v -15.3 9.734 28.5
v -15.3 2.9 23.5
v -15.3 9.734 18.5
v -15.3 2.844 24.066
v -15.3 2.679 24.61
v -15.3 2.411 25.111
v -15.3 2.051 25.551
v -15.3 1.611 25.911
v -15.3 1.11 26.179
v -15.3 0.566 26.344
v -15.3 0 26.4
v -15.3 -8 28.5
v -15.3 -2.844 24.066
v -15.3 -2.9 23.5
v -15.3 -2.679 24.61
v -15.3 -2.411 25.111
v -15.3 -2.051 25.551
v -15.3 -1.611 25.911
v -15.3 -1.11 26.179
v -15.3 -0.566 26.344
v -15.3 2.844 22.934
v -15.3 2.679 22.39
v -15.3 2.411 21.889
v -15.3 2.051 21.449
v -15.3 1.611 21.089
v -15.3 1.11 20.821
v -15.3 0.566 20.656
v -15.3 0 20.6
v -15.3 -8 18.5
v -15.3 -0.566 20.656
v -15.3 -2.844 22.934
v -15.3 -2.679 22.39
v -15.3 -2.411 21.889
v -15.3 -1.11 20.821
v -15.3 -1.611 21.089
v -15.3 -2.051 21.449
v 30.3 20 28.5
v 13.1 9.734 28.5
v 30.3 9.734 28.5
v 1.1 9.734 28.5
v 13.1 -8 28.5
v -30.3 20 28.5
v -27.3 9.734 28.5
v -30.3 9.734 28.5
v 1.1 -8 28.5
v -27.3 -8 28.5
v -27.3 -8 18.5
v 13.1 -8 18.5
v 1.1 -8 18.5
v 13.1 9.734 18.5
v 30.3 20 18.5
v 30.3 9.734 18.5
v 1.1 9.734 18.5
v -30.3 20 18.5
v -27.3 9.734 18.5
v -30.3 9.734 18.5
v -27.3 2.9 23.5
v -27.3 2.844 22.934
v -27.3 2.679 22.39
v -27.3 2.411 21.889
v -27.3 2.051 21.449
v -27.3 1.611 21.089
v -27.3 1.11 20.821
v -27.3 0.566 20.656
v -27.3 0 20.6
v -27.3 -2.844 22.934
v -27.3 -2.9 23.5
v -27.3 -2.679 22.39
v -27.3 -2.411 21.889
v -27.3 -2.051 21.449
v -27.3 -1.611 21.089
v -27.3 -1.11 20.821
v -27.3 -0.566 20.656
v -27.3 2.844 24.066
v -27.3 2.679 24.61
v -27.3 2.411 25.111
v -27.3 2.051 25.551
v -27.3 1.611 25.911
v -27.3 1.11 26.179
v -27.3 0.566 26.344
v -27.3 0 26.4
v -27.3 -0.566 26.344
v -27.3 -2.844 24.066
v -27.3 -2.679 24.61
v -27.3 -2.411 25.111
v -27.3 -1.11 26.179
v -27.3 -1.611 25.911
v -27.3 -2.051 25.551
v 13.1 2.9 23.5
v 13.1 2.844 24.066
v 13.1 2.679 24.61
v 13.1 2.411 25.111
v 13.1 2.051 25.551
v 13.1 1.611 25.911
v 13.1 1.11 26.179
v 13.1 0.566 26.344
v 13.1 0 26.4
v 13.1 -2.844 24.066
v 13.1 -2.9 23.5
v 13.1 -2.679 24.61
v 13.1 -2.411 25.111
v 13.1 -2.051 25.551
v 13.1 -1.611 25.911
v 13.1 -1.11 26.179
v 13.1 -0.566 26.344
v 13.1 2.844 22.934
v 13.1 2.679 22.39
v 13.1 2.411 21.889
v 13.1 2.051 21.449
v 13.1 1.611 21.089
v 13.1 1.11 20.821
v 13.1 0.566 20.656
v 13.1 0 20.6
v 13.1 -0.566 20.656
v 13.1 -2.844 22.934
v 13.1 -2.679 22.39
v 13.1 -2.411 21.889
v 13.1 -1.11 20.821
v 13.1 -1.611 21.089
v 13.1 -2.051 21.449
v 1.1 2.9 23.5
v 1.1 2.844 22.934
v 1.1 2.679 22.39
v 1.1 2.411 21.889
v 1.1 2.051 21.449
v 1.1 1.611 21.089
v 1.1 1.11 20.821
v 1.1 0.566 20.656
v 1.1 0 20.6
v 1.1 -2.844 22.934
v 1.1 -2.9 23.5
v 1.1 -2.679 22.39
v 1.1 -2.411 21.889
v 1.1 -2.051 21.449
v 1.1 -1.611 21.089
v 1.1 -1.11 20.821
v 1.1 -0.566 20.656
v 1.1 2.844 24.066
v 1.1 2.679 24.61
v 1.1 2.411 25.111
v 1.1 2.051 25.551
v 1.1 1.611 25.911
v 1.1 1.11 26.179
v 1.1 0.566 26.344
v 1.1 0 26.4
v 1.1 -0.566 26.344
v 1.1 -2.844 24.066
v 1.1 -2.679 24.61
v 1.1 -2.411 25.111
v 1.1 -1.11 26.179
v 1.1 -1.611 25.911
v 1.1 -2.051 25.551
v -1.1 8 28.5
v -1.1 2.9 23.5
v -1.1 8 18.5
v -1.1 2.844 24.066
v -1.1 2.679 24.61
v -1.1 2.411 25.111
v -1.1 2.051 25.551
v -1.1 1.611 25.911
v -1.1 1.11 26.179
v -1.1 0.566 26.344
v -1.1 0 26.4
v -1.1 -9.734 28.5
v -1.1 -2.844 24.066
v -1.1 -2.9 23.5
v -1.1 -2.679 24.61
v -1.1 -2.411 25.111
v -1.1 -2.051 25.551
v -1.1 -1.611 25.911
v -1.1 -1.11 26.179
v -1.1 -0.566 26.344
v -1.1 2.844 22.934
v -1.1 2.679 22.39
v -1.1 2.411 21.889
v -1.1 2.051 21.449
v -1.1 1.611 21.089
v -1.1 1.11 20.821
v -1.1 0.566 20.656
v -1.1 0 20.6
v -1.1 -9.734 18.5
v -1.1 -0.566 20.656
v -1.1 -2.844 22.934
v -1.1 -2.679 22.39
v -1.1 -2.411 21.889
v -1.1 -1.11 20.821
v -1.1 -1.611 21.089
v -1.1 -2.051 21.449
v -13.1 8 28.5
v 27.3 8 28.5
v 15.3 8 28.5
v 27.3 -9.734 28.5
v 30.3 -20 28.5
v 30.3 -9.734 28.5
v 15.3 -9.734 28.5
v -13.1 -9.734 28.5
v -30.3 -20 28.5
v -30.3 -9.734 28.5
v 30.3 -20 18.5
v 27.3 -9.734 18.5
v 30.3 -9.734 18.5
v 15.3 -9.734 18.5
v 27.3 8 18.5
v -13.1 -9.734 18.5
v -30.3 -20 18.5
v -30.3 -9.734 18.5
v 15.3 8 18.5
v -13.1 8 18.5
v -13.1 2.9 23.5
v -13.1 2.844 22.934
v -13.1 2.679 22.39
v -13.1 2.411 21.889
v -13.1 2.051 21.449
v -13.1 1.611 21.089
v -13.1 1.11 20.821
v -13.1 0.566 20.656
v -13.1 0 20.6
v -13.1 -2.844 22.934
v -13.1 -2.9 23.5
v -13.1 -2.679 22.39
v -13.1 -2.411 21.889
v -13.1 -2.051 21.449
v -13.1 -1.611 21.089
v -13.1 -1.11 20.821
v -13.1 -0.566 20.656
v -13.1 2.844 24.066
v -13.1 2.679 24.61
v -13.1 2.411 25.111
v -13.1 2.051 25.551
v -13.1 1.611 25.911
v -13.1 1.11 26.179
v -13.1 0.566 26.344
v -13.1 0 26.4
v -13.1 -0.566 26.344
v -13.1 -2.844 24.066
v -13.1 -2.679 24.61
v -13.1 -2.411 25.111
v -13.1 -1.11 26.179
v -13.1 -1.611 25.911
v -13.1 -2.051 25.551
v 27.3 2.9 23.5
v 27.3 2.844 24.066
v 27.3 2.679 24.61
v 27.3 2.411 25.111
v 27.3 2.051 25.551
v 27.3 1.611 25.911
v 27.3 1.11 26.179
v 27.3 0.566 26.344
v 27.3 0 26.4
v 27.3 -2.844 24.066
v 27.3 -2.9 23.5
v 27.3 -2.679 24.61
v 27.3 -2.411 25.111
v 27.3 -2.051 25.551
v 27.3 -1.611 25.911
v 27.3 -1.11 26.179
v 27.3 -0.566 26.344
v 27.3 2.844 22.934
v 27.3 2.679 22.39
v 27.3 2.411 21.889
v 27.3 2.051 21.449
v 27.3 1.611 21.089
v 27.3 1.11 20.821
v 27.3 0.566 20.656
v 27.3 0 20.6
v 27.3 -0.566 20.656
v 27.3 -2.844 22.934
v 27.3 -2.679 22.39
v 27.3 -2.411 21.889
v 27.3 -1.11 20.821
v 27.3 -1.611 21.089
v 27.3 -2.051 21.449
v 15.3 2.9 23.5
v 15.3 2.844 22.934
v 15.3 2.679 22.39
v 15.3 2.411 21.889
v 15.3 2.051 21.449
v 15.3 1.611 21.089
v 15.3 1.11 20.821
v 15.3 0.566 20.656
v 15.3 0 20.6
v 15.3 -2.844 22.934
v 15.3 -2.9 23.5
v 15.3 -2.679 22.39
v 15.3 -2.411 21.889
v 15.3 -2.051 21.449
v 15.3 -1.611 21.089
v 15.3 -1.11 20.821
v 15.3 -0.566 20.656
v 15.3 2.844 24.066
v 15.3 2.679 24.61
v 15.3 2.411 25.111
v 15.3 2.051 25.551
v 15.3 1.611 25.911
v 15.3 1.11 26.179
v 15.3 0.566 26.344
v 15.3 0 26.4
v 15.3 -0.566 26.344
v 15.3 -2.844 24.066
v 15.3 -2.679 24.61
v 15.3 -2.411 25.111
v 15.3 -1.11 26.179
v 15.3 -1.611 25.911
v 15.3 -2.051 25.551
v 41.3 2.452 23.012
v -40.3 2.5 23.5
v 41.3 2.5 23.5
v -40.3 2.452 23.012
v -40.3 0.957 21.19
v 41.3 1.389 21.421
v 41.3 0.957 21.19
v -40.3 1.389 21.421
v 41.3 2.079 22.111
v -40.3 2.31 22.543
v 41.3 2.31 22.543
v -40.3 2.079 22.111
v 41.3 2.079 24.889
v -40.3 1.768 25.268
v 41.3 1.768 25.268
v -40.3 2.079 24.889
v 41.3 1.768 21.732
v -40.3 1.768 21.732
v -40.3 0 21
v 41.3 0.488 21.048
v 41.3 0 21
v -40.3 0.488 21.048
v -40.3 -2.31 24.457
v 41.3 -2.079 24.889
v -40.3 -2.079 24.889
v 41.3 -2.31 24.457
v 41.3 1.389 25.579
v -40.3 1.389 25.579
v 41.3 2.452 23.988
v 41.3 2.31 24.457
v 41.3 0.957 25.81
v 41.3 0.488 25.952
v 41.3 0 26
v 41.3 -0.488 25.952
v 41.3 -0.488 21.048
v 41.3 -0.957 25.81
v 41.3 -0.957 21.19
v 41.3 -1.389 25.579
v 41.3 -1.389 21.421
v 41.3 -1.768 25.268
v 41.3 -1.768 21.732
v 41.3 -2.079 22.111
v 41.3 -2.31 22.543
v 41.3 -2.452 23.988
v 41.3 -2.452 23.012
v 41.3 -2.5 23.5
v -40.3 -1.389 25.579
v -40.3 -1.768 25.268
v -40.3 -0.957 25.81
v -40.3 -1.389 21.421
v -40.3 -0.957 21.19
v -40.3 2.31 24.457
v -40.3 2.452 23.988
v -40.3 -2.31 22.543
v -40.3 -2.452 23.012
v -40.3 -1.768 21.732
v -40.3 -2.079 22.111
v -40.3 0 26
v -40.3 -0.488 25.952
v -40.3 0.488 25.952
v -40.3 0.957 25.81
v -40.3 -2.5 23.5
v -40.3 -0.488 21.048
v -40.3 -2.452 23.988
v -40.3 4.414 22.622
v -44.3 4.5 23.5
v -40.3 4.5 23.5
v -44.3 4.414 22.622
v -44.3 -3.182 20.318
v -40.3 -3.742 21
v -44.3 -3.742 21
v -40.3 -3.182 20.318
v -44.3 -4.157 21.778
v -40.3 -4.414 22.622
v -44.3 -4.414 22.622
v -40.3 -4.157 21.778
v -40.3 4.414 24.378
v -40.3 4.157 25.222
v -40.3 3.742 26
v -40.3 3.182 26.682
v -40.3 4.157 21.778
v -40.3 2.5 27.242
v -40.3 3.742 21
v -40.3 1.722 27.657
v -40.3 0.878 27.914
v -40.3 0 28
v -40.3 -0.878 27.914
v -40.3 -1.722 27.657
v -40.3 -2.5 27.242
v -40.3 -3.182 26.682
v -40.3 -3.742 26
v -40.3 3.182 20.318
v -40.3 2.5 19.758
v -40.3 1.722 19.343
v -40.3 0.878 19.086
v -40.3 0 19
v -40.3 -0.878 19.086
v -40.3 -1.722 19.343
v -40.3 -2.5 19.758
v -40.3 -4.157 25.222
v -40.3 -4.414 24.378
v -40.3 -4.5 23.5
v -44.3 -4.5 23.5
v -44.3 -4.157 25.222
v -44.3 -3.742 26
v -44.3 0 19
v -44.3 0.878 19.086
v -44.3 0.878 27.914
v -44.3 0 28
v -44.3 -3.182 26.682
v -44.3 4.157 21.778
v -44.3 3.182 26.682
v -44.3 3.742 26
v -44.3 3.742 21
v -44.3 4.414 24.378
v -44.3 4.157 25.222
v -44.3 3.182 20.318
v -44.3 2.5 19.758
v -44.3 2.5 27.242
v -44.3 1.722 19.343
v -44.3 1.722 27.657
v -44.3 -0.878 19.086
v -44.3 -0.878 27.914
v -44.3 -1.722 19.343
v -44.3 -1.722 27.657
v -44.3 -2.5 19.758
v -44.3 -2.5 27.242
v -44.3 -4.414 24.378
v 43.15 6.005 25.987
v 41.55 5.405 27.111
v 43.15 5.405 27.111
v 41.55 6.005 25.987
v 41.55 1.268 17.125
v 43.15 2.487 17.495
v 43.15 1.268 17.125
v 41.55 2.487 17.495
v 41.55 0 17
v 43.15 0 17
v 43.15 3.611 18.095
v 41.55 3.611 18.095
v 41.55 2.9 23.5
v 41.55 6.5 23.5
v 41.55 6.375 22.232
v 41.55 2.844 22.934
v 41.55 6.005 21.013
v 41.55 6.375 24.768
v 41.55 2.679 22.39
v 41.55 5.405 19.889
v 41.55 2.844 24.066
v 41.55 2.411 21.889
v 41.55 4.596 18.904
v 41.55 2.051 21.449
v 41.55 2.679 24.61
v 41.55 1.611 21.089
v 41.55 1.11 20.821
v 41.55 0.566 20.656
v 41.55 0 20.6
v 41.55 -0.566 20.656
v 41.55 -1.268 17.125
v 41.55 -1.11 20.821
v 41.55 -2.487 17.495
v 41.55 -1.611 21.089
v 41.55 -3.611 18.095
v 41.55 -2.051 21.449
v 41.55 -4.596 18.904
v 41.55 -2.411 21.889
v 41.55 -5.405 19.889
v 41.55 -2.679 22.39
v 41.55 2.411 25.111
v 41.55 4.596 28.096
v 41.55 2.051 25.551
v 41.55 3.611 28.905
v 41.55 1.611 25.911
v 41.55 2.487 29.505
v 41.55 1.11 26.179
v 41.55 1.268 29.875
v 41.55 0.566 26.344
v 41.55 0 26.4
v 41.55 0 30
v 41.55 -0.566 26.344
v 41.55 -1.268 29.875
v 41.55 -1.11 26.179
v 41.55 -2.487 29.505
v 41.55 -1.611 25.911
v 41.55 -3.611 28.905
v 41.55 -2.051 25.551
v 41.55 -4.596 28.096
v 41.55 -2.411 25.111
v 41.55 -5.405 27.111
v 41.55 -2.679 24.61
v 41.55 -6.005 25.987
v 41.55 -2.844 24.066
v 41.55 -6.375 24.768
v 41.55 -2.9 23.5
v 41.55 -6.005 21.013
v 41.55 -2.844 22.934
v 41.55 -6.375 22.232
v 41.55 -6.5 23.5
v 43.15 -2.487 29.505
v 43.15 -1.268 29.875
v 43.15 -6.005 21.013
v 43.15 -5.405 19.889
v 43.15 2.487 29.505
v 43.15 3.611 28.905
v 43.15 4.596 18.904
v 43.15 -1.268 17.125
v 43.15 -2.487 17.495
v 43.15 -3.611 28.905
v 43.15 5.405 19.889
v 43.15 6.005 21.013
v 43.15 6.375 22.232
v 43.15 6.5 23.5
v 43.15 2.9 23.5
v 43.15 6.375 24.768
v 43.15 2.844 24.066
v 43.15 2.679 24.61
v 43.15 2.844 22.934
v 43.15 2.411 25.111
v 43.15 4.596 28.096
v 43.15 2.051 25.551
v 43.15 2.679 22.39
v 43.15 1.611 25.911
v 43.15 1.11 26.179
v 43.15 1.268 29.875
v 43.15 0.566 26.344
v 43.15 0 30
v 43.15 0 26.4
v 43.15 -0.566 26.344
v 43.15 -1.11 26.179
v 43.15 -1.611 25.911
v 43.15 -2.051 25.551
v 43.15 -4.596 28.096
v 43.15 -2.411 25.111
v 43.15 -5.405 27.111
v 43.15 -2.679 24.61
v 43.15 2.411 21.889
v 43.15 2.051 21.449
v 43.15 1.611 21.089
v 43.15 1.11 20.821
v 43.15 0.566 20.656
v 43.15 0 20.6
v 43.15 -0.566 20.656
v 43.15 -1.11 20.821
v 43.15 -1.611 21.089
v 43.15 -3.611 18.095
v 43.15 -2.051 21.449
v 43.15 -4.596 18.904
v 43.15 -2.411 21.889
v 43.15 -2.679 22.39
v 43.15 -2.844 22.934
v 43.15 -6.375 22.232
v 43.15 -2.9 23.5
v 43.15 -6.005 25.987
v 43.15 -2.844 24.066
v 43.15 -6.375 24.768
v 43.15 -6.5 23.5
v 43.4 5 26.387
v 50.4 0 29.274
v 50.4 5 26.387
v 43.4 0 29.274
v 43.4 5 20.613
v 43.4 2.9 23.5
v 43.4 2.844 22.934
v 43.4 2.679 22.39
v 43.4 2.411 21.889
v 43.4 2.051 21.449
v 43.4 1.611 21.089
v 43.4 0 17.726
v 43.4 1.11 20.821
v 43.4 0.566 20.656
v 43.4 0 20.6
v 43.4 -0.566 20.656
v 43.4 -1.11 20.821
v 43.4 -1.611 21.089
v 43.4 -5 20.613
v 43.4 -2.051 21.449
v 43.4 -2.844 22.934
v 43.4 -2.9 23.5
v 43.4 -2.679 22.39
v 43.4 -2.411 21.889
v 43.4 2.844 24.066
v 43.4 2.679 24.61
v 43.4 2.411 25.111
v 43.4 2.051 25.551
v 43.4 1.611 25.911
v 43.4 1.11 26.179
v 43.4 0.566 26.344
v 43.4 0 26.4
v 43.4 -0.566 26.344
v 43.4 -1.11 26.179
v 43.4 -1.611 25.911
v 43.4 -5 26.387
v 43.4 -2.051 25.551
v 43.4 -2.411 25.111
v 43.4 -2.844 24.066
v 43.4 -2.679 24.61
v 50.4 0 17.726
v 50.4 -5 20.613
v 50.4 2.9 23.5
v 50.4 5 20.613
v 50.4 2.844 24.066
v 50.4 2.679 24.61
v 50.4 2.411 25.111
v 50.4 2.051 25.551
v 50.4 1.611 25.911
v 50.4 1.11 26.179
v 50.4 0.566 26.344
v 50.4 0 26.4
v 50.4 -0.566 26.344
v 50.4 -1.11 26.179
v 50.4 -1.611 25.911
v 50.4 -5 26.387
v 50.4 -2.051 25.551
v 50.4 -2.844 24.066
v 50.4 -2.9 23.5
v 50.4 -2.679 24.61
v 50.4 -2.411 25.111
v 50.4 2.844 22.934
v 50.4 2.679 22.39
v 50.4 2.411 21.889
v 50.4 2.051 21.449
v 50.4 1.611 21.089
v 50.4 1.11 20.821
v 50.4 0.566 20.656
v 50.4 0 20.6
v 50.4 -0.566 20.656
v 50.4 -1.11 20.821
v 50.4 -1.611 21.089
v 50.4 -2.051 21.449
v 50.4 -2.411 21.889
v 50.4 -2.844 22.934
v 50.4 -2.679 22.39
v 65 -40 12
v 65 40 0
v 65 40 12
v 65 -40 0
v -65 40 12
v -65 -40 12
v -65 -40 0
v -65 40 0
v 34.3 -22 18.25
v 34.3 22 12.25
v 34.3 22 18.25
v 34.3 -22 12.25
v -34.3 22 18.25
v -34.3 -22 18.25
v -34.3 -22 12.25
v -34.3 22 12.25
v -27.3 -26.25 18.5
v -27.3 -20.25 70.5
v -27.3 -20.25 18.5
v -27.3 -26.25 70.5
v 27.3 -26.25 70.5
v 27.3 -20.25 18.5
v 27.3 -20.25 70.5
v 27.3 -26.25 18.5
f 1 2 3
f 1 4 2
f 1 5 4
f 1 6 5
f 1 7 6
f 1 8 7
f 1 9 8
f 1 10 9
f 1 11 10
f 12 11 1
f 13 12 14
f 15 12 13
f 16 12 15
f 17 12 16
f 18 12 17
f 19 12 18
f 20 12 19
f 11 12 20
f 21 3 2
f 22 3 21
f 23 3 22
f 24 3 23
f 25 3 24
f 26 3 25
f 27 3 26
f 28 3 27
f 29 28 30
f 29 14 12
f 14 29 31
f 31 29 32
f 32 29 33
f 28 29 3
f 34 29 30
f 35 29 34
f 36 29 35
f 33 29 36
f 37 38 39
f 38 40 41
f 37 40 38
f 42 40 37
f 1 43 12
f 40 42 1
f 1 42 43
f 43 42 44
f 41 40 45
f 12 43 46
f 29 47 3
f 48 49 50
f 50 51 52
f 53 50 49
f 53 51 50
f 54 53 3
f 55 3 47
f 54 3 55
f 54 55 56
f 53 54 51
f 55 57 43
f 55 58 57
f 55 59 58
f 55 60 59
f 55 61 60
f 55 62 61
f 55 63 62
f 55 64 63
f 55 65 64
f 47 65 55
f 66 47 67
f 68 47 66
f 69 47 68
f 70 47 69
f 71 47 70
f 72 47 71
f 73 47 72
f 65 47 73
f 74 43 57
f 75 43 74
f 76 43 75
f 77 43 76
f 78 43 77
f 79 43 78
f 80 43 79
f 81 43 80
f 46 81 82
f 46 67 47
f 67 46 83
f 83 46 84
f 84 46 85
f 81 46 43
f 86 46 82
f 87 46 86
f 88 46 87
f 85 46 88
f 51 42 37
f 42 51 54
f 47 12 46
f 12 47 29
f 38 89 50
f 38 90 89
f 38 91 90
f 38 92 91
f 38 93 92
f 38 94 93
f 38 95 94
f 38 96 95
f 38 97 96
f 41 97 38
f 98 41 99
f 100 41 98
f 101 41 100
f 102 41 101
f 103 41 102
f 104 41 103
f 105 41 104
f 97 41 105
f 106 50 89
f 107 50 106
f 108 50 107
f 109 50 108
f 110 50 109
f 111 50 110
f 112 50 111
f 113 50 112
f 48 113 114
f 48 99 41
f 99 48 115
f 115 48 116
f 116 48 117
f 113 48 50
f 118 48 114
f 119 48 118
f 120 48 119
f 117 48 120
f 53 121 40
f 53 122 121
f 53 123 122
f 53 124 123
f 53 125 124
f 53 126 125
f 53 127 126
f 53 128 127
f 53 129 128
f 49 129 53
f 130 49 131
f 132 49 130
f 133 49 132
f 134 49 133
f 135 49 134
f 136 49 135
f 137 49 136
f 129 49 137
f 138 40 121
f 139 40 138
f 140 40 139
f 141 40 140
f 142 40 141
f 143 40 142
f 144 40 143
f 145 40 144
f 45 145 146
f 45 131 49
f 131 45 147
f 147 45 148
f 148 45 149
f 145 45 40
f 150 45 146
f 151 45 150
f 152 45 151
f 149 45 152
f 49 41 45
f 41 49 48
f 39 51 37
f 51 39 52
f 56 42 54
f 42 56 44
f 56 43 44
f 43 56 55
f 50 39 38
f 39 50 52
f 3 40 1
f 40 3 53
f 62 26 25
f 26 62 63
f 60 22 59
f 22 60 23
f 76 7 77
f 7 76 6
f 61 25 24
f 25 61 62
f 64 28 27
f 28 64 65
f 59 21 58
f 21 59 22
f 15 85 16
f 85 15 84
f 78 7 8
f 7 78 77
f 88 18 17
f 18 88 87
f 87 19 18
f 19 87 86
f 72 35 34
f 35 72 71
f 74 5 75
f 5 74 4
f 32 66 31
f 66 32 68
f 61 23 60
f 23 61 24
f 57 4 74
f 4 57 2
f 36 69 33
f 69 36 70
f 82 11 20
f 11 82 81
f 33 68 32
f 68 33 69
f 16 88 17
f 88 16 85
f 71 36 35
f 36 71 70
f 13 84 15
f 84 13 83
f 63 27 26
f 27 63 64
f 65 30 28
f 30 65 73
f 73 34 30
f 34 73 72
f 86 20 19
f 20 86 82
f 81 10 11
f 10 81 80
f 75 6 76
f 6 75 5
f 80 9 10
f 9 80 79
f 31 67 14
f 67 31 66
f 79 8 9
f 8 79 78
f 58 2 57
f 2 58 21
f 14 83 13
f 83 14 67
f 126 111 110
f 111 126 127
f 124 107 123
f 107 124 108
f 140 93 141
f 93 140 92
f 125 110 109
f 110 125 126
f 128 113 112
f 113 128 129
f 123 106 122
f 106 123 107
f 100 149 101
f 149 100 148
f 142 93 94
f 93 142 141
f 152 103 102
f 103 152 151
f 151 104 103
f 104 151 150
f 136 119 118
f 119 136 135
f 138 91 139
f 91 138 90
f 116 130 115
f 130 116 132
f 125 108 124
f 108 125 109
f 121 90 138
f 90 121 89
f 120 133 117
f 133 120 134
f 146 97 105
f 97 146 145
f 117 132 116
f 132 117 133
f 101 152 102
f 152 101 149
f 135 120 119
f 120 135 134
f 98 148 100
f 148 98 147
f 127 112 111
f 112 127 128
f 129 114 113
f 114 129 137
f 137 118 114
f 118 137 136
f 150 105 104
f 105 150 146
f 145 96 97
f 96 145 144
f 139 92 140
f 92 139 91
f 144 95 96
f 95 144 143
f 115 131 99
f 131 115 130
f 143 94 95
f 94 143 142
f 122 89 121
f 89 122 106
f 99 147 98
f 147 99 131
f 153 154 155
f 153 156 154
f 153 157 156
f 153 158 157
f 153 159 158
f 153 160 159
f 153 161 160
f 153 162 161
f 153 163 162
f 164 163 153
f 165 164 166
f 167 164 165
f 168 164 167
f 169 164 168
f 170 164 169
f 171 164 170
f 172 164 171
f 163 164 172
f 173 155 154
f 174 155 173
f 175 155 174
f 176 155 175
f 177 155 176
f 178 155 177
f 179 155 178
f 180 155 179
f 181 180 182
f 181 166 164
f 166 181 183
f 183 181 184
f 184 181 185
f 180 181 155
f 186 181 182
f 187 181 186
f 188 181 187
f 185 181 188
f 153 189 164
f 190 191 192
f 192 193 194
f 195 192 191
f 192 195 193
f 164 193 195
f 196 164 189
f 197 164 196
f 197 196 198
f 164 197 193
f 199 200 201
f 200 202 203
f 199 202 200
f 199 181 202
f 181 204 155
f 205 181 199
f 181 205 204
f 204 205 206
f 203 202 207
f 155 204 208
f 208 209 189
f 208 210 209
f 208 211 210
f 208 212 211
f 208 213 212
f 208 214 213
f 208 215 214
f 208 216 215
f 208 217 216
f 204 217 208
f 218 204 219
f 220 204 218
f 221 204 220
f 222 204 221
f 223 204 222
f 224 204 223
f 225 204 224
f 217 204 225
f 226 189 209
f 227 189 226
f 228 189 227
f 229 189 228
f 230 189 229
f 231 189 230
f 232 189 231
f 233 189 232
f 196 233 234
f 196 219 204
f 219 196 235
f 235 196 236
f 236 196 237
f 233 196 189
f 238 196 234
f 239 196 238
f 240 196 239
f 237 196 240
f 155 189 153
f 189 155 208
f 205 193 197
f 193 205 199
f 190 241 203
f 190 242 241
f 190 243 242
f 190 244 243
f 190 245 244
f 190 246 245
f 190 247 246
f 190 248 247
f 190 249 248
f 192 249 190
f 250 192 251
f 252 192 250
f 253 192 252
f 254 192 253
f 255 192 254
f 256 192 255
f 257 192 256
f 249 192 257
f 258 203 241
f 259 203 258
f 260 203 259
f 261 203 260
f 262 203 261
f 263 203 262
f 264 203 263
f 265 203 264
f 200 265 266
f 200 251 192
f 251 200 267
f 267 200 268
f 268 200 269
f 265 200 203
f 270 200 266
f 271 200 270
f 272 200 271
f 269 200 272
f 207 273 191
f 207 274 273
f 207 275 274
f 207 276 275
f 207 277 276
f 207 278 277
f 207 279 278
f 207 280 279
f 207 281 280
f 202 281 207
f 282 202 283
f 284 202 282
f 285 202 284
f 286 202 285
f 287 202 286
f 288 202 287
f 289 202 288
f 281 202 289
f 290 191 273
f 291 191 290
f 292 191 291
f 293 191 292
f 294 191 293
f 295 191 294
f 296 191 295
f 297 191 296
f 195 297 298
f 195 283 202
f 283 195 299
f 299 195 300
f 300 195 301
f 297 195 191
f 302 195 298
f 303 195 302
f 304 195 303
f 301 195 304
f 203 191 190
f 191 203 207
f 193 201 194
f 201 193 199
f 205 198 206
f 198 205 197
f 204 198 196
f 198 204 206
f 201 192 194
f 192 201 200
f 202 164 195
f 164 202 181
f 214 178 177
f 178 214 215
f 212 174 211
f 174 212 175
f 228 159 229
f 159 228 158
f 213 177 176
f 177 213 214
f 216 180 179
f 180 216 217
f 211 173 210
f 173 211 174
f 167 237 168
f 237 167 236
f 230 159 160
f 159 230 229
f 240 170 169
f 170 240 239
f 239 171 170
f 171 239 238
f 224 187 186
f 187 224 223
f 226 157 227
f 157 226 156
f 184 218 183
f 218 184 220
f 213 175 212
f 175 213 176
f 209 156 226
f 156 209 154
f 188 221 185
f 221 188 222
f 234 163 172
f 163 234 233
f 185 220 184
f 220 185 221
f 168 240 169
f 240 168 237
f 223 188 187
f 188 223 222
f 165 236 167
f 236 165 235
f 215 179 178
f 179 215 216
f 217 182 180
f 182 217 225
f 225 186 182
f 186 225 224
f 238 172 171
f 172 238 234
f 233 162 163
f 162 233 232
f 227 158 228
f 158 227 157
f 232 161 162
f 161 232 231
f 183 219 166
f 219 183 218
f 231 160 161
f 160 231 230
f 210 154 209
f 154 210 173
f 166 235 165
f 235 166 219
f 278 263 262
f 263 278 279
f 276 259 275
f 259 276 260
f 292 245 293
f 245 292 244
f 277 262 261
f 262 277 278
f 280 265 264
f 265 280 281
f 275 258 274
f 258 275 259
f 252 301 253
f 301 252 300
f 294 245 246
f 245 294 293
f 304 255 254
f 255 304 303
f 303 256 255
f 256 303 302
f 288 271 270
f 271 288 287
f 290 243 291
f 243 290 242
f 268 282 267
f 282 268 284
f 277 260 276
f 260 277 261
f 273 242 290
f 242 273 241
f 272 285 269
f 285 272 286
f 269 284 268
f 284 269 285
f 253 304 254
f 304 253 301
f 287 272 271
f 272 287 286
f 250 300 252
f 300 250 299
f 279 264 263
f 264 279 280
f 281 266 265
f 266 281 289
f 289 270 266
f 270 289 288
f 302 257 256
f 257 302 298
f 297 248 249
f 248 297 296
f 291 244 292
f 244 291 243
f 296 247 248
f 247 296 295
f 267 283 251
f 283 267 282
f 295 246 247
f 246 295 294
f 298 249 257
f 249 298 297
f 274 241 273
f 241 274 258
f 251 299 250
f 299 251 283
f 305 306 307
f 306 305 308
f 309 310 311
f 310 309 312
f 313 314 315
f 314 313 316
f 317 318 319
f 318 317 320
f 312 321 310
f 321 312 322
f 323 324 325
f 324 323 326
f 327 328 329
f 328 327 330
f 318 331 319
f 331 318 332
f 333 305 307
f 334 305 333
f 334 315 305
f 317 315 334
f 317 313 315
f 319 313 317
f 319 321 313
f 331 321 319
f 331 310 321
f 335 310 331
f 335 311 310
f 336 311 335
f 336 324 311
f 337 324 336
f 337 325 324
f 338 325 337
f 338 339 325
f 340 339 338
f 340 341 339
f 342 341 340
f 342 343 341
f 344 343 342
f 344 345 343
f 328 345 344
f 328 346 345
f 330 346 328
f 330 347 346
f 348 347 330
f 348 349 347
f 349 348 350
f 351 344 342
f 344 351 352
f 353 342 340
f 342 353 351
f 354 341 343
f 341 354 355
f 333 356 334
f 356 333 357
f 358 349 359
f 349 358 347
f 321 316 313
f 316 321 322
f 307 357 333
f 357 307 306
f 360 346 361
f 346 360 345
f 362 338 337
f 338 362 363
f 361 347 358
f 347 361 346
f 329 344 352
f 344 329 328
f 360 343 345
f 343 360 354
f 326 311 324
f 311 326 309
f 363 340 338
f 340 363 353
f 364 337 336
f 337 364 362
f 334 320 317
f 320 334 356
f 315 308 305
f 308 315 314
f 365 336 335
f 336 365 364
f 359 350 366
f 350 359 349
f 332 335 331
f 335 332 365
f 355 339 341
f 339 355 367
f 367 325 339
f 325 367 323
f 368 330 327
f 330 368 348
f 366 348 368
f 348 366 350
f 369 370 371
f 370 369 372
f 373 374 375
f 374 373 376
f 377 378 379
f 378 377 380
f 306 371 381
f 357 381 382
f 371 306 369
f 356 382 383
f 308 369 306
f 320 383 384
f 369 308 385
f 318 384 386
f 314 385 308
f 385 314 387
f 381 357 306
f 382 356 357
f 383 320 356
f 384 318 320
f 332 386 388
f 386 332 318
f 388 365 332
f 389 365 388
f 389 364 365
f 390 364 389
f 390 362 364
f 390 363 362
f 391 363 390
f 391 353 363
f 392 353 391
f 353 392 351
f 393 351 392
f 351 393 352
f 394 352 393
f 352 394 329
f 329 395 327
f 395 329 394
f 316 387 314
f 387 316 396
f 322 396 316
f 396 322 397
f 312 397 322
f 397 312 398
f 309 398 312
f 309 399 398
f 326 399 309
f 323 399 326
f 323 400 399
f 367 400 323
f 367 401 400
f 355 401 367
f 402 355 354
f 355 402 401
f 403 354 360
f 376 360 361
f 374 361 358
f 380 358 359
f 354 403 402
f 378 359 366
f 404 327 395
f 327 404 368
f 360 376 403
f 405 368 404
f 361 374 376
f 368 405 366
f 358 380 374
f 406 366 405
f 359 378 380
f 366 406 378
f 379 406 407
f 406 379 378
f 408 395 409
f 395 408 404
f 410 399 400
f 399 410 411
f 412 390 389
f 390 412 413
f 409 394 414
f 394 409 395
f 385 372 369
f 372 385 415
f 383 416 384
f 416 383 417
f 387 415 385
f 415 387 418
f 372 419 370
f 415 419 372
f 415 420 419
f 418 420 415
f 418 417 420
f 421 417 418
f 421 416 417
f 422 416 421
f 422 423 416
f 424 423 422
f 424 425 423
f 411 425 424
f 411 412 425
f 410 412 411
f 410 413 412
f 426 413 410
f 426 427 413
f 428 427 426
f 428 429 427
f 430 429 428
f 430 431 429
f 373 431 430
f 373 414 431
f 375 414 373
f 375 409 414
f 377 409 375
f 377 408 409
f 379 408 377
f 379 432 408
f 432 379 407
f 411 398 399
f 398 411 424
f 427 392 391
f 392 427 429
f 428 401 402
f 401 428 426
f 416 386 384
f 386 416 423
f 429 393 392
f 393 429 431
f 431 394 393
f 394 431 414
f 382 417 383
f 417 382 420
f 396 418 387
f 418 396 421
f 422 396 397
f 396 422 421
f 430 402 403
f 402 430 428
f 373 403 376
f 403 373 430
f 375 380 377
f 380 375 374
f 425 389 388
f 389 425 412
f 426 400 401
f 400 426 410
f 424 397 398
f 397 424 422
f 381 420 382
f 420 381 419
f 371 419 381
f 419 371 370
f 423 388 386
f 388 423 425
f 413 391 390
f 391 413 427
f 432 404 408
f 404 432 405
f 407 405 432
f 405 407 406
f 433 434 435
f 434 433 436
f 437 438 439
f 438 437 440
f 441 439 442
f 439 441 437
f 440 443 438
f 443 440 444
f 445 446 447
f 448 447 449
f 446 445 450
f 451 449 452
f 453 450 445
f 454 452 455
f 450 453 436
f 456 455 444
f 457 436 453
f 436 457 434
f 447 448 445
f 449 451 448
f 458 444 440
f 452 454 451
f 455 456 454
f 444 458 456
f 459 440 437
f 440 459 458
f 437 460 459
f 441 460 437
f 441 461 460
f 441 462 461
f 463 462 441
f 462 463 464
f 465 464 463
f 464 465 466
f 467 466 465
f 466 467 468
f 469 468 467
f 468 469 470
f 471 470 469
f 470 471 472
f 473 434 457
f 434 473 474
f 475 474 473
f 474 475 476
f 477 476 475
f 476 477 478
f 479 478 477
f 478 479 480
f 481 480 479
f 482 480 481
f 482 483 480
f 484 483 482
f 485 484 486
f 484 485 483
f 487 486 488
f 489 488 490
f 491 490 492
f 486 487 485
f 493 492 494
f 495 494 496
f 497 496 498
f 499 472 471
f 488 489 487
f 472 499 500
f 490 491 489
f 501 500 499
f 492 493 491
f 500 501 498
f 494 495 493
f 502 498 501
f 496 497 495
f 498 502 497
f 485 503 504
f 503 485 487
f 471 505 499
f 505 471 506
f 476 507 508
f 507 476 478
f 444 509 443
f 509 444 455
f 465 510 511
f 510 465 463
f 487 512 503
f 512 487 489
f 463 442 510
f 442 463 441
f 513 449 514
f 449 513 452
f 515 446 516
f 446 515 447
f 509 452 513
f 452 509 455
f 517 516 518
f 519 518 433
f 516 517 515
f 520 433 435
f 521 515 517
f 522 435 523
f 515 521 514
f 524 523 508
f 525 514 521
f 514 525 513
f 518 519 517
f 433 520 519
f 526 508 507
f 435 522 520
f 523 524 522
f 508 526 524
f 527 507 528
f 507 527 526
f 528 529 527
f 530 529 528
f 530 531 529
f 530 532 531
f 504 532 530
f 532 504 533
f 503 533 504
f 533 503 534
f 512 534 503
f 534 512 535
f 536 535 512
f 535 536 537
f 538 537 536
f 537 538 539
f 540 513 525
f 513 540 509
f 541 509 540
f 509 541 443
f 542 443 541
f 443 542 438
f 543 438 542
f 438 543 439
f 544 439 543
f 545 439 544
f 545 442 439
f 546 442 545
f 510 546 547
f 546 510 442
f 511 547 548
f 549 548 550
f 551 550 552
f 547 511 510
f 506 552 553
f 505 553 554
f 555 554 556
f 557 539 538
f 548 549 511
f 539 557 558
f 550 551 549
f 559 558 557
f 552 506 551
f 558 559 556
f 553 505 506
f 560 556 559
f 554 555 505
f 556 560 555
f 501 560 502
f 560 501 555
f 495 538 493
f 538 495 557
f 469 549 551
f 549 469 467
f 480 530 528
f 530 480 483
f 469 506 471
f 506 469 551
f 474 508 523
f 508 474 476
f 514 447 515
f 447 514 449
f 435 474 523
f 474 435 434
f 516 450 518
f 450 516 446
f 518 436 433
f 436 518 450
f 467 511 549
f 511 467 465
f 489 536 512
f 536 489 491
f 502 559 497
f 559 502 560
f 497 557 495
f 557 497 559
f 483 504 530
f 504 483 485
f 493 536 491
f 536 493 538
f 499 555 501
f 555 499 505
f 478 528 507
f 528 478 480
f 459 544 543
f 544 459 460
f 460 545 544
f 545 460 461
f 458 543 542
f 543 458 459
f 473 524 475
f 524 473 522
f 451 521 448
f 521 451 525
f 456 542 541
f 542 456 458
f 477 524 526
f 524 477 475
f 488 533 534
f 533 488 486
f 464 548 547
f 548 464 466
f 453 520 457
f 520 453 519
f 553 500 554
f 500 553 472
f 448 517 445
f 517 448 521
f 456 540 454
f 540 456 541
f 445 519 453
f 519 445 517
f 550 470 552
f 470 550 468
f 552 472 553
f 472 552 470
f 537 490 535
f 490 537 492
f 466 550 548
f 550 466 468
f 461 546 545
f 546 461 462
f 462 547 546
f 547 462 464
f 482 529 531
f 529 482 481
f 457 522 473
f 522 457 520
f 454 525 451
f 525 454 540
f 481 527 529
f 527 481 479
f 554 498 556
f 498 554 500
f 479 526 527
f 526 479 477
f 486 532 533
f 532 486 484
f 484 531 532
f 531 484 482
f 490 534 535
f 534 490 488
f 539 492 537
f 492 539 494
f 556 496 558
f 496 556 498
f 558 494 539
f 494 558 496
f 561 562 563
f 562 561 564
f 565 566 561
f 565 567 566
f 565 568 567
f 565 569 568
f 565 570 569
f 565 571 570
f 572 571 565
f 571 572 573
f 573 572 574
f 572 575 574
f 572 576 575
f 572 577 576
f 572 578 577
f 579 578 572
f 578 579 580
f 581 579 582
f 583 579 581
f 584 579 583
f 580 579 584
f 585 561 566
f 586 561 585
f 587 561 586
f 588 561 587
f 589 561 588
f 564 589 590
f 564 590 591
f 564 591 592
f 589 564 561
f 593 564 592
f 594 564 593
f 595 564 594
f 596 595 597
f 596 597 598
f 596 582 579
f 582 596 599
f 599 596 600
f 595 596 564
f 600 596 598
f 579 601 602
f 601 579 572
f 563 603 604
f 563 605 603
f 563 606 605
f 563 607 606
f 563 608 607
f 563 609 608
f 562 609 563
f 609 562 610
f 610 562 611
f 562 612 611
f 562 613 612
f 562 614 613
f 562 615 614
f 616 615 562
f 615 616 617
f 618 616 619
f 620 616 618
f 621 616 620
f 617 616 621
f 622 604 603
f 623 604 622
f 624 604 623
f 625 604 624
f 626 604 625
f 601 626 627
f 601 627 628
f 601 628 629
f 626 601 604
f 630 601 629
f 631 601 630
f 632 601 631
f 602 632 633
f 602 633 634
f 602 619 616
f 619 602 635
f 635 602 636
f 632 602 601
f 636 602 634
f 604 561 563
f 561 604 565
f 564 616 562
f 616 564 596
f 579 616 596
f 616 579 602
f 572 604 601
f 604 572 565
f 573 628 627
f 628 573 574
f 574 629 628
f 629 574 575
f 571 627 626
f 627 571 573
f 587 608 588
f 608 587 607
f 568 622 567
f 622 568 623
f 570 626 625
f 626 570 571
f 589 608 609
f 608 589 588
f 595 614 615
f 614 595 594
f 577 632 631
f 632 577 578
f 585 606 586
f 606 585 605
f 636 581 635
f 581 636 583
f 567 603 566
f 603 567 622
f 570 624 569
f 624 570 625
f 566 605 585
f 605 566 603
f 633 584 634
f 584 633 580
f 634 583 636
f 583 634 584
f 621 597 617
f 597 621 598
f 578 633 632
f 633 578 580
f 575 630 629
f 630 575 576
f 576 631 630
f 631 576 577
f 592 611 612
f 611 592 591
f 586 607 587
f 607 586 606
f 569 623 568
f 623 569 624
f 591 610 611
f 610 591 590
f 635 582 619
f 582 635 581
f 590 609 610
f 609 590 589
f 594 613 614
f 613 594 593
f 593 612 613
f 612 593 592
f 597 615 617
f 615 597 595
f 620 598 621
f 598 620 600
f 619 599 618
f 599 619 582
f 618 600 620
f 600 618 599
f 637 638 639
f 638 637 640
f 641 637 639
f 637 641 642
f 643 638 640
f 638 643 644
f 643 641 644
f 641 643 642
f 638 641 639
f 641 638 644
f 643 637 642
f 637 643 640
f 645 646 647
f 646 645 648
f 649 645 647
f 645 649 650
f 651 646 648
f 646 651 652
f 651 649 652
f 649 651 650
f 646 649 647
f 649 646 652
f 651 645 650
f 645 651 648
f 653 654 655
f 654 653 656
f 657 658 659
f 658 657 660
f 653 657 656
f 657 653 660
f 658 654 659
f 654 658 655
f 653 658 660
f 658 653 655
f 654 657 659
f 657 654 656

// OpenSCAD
$fn = 32;

// ------------------------------------------------------------------------
// Comb hinge with flap: leaf 60.6 x 20 mm, pin d5, flap 52 mm
// Every part is its own module, assembly() places every instance.
// ------------------------------------------------------------------------

// --- part 1 ---
module hinge_bed() {
  difference() {
    translate([-65, -40, 0]) cube([130, 80, 12]);
  }
}

// --- part 2 ---
module hinge_riser() {
  difference() {
    translate([-34.3, -22, 0]) cube([68.6, 44, 6]);
  }
}

// --- part 3 ---
module hinge_leaf_a() {
  difference() {
    union() {
      translate([-27.3, -8, -5]) cube([12, 28, 10]);
      translate([1.1, -8, -5]) cube([12, 28, 10]);
      translate([-30.3, 9.734, -5]) cube([60.6, 10.266, 10]);
    }
    translate([-21.3, 0, 0]) rotate([0, 90, 0]) cylinder(h = 14, d = 5.8, center = true);
    translate([7.1, 0, 0]) rotate([0, 90, 0]) cylinder(h = 14, d = 5.8, center = true);
  }
}

// --- part 4 ---
module hinge_leaf_b() {
  difference() {
    union() {
      translate([-13.1, -20, -5]) cube([12, 28, 10]);
      translate([15.3, -20, -5]) cube([12, 28, 10]);
      translate([-30.3, -20, -5]) cube([60.6, 10.266, 10]);
    }
    translate([-7.1, 0, 0]) rotate([0, 90, 0]) cylinder(h = 14, d = 5.8, center = true);
    translate([21.3, 0, 0]) rotate([0, 90, 0]) cylinder(h = 14, d = 5.8, center = true);
  }
}

// --- part 5 ---
module hinge_flap() {
  difference() {
    translate([-27.3, -26, 0]) cube([54.6, 52, 6]);
  }
}

// --- part 6 ---
module hinge_pin() {
  rotate([0, 90, 0]) cylinder(h = 82.6, d = 5, center = true);
  translate([-44.3, 0, 0]) rotate([0, 90, 0]) cylinder(h = 4, d = 9);
}

// --- part 7 ---
module pin_washer() {
  difference() {
      translate([0, 0, 0]) cylinder(h = 1.6, d = 13);
      translate([0, 0, -1]) cylinder(h = 3.6, d = 5.8);
    }
}

// --- part 8 ---
module pin_nut() {
  difference() {
    linear_extrude(height = 7) polygon(points = [[5.774, 0], [2.887, 5], [-2.887, 5], [-5.774, 0], [-2.887, -5], [2.887, -5]]);
    translate([0, 0, -1]) cylinder(h = 9, d = 5.8);
  }
}

// --- assembly ---
module assembly() {
  color([0.80, 0.24, 0.20]) translate([0, 0, 0]) rotate([0, 0, 0]) hinge_bed();
  color([0.20, 0.45, 0.75]) translate([0, 0, 12.25]) rotate([0, 0, 0]) hinge_riser();
  color([0.25, 0.62, 0.32]) translate([0, 0, 23.5]) rotate([0, 0, 0]) hinge_leaf_a();
  color([0.92, 0.70, 0.18]) translate([0, 0, 23.5]) rotate([0, 0, 0]) hinge_leaf_b();
  color([0.58, 0.35, 0.70]) translate([0, -20.25, 44.5]) rotate([90, 0, 0]) hinge_flap();
  color([0.16, 0.66, 0.66]) translate([0, 0, 23.5]) rotate([0, 0, 0]) hinge_pin();
  color([0.85, 0.48, 0.18]) translate([41.55, 0, 23.5]) rotate([0, 90, 0]) pin_washer();
  color([0.55, 0.60, 0.65]) translate([43.4, 0, 23.5]) rotate([0, 90, 0]) pin_nut();
}

assembly();
